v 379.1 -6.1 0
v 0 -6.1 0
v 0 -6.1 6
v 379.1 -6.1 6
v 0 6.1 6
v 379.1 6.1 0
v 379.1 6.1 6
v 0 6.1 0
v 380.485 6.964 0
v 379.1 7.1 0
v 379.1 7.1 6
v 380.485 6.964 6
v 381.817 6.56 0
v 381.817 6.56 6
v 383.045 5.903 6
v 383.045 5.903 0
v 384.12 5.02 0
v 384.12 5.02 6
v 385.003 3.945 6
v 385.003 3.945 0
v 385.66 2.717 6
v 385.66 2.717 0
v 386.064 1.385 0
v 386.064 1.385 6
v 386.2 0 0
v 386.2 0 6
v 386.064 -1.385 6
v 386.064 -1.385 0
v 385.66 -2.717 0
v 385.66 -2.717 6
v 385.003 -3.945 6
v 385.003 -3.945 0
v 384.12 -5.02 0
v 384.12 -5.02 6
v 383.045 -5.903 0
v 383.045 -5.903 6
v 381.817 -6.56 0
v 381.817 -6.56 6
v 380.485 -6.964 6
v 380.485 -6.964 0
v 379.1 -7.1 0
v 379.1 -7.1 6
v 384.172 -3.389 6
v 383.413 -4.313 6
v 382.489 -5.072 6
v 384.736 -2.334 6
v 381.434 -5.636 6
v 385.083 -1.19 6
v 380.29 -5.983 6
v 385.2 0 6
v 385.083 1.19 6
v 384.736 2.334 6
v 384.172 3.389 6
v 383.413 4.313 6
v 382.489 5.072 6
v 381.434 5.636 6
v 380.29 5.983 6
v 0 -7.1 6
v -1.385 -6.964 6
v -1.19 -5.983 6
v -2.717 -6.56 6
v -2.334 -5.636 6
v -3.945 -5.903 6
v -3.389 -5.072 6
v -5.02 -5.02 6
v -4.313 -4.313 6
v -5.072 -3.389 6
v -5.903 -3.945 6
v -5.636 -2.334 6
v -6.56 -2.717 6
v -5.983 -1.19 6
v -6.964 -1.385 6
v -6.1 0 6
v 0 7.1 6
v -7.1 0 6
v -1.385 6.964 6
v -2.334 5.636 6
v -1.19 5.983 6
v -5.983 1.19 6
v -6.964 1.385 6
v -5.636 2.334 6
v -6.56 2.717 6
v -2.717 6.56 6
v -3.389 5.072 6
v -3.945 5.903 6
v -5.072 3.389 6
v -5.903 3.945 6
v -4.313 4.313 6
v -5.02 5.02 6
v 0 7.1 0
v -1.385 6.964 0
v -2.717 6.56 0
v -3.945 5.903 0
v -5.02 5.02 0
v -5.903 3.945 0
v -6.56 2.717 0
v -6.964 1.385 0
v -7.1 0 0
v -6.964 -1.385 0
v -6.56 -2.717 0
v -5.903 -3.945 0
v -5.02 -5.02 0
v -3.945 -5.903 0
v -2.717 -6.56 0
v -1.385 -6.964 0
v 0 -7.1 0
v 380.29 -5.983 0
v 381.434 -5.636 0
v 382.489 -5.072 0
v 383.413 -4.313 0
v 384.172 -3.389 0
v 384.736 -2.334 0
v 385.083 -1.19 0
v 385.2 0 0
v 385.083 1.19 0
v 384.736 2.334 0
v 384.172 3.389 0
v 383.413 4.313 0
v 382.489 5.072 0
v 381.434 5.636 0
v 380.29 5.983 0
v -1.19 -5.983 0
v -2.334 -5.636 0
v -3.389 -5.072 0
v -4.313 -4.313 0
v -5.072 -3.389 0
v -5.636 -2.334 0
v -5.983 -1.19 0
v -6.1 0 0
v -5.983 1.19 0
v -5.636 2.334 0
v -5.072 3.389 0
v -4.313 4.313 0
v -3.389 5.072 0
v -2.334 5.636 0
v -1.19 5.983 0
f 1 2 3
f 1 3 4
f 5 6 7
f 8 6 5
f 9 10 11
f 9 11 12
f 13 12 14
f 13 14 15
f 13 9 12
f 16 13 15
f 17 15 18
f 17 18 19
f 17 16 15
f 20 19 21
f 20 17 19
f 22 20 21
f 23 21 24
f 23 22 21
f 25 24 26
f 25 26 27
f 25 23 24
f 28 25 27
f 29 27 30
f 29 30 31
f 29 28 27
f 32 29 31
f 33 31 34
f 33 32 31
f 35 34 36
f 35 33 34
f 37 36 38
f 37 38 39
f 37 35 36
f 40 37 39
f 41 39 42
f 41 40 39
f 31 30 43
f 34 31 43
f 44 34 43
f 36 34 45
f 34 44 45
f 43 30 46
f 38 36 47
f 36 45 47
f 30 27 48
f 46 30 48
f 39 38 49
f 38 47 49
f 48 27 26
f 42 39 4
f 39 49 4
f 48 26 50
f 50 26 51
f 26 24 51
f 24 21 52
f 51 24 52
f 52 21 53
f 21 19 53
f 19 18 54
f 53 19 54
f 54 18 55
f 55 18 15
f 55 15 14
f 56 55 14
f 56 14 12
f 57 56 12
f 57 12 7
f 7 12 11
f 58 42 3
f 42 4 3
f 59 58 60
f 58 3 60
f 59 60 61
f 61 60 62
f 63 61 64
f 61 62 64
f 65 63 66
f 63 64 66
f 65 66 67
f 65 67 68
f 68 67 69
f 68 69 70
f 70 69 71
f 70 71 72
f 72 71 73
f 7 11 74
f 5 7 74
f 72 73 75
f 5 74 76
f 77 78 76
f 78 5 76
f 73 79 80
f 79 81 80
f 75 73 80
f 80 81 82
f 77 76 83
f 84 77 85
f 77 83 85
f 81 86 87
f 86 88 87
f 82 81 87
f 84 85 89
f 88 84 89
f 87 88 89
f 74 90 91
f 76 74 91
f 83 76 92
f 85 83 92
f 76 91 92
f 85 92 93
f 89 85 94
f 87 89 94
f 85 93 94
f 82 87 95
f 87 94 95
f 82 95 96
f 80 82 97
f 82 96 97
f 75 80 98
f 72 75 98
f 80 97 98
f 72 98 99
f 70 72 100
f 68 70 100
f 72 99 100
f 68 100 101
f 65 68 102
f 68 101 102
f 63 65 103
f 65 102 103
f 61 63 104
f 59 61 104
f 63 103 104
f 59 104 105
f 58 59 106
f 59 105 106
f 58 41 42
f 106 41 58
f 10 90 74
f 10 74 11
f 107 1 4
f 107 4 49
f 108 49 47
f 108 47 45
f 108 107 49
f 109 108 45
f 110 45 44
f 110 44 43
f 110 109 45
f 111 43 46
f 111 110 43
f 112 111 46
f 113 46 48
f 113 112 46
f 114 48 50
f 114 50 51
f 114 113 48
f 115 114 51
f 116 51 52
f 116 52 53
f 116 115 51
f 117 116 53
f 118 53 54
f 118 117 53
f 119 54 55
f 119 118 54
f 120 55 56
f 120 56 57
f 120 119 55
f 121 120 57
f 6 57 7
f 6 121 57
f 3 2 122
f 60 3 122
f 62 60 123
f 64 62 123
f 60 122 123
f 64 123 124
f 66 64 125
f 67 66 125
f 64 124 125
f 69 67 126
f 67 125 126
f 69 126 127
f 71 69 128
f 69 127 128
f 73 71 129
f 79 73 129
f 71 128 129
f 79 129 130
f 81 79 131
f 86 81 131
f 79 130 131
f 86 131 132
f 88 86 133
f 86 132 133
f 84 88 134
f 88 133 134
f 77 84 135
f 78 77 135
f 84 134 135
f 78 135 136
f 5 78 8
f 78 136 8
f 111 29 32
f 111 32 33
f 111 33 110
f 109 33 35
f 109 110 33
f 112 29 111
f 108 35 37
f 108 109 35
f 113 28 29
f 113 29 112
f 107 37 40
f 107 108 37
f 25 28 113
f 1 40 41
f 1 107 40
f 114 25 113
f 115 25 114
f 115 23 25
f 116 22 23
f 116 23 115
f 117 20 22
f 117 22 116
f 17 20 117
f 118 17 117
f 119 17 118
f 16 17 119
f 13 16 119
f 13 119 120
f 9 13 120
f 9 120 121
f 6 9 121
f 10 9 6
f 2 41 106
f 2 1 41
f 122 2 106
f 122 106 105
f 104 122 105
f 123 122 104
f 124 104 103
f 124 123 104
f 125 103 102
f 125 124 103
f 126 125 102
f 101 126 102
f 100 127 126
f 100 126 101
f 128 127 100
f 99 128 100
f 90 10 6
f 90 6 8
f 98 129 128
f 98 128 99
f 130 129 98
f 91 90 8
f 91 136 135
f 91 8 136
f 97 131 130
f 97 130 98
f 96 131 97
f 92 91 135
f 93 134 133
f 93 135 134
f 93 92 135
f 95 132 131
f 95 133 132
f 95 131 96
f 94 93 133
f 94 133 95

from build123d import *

# Parameters (mm, degrees)
EXTRUDE_THIN1_DEPTH = 6


with BuildPart() as part:
    # Sketch2 → Extrude-Thin1 (new body)
    with BuildSketch(Plane.XY):
        with BuildLine():
            Line((189.55, -6.1), (0, -6.1))
            ThreePointArc((0, -6.1), (-6.1, 0), (0, 6.1))
            Line((0, 6.1), (189.55, 6.1))
            Line((189.55, 6.1), (189.55, 7.1))
            Line((189.55, 7.1), (0, 7.1))
            ThreePointArc((0, 7.1), (-7.1, 0), (0, -7.1))
            Line((0, -7.1), (189.55, -7.1))
            Line((189.55, -7.1), (189.55, -6.1))
        make_face()
    extrude_thin1 = extrude(amount=EXTRUDE_THIN1_DEPTH)

    # Mirror1: Extrude-Thin1 across plane
    add(extrude_thin1.mirror(Plane(origin=(189.55, 7.1, 6), x_dir=(0, 0, 1), z_dir=(1, 0, 0))))


solid = part.part
